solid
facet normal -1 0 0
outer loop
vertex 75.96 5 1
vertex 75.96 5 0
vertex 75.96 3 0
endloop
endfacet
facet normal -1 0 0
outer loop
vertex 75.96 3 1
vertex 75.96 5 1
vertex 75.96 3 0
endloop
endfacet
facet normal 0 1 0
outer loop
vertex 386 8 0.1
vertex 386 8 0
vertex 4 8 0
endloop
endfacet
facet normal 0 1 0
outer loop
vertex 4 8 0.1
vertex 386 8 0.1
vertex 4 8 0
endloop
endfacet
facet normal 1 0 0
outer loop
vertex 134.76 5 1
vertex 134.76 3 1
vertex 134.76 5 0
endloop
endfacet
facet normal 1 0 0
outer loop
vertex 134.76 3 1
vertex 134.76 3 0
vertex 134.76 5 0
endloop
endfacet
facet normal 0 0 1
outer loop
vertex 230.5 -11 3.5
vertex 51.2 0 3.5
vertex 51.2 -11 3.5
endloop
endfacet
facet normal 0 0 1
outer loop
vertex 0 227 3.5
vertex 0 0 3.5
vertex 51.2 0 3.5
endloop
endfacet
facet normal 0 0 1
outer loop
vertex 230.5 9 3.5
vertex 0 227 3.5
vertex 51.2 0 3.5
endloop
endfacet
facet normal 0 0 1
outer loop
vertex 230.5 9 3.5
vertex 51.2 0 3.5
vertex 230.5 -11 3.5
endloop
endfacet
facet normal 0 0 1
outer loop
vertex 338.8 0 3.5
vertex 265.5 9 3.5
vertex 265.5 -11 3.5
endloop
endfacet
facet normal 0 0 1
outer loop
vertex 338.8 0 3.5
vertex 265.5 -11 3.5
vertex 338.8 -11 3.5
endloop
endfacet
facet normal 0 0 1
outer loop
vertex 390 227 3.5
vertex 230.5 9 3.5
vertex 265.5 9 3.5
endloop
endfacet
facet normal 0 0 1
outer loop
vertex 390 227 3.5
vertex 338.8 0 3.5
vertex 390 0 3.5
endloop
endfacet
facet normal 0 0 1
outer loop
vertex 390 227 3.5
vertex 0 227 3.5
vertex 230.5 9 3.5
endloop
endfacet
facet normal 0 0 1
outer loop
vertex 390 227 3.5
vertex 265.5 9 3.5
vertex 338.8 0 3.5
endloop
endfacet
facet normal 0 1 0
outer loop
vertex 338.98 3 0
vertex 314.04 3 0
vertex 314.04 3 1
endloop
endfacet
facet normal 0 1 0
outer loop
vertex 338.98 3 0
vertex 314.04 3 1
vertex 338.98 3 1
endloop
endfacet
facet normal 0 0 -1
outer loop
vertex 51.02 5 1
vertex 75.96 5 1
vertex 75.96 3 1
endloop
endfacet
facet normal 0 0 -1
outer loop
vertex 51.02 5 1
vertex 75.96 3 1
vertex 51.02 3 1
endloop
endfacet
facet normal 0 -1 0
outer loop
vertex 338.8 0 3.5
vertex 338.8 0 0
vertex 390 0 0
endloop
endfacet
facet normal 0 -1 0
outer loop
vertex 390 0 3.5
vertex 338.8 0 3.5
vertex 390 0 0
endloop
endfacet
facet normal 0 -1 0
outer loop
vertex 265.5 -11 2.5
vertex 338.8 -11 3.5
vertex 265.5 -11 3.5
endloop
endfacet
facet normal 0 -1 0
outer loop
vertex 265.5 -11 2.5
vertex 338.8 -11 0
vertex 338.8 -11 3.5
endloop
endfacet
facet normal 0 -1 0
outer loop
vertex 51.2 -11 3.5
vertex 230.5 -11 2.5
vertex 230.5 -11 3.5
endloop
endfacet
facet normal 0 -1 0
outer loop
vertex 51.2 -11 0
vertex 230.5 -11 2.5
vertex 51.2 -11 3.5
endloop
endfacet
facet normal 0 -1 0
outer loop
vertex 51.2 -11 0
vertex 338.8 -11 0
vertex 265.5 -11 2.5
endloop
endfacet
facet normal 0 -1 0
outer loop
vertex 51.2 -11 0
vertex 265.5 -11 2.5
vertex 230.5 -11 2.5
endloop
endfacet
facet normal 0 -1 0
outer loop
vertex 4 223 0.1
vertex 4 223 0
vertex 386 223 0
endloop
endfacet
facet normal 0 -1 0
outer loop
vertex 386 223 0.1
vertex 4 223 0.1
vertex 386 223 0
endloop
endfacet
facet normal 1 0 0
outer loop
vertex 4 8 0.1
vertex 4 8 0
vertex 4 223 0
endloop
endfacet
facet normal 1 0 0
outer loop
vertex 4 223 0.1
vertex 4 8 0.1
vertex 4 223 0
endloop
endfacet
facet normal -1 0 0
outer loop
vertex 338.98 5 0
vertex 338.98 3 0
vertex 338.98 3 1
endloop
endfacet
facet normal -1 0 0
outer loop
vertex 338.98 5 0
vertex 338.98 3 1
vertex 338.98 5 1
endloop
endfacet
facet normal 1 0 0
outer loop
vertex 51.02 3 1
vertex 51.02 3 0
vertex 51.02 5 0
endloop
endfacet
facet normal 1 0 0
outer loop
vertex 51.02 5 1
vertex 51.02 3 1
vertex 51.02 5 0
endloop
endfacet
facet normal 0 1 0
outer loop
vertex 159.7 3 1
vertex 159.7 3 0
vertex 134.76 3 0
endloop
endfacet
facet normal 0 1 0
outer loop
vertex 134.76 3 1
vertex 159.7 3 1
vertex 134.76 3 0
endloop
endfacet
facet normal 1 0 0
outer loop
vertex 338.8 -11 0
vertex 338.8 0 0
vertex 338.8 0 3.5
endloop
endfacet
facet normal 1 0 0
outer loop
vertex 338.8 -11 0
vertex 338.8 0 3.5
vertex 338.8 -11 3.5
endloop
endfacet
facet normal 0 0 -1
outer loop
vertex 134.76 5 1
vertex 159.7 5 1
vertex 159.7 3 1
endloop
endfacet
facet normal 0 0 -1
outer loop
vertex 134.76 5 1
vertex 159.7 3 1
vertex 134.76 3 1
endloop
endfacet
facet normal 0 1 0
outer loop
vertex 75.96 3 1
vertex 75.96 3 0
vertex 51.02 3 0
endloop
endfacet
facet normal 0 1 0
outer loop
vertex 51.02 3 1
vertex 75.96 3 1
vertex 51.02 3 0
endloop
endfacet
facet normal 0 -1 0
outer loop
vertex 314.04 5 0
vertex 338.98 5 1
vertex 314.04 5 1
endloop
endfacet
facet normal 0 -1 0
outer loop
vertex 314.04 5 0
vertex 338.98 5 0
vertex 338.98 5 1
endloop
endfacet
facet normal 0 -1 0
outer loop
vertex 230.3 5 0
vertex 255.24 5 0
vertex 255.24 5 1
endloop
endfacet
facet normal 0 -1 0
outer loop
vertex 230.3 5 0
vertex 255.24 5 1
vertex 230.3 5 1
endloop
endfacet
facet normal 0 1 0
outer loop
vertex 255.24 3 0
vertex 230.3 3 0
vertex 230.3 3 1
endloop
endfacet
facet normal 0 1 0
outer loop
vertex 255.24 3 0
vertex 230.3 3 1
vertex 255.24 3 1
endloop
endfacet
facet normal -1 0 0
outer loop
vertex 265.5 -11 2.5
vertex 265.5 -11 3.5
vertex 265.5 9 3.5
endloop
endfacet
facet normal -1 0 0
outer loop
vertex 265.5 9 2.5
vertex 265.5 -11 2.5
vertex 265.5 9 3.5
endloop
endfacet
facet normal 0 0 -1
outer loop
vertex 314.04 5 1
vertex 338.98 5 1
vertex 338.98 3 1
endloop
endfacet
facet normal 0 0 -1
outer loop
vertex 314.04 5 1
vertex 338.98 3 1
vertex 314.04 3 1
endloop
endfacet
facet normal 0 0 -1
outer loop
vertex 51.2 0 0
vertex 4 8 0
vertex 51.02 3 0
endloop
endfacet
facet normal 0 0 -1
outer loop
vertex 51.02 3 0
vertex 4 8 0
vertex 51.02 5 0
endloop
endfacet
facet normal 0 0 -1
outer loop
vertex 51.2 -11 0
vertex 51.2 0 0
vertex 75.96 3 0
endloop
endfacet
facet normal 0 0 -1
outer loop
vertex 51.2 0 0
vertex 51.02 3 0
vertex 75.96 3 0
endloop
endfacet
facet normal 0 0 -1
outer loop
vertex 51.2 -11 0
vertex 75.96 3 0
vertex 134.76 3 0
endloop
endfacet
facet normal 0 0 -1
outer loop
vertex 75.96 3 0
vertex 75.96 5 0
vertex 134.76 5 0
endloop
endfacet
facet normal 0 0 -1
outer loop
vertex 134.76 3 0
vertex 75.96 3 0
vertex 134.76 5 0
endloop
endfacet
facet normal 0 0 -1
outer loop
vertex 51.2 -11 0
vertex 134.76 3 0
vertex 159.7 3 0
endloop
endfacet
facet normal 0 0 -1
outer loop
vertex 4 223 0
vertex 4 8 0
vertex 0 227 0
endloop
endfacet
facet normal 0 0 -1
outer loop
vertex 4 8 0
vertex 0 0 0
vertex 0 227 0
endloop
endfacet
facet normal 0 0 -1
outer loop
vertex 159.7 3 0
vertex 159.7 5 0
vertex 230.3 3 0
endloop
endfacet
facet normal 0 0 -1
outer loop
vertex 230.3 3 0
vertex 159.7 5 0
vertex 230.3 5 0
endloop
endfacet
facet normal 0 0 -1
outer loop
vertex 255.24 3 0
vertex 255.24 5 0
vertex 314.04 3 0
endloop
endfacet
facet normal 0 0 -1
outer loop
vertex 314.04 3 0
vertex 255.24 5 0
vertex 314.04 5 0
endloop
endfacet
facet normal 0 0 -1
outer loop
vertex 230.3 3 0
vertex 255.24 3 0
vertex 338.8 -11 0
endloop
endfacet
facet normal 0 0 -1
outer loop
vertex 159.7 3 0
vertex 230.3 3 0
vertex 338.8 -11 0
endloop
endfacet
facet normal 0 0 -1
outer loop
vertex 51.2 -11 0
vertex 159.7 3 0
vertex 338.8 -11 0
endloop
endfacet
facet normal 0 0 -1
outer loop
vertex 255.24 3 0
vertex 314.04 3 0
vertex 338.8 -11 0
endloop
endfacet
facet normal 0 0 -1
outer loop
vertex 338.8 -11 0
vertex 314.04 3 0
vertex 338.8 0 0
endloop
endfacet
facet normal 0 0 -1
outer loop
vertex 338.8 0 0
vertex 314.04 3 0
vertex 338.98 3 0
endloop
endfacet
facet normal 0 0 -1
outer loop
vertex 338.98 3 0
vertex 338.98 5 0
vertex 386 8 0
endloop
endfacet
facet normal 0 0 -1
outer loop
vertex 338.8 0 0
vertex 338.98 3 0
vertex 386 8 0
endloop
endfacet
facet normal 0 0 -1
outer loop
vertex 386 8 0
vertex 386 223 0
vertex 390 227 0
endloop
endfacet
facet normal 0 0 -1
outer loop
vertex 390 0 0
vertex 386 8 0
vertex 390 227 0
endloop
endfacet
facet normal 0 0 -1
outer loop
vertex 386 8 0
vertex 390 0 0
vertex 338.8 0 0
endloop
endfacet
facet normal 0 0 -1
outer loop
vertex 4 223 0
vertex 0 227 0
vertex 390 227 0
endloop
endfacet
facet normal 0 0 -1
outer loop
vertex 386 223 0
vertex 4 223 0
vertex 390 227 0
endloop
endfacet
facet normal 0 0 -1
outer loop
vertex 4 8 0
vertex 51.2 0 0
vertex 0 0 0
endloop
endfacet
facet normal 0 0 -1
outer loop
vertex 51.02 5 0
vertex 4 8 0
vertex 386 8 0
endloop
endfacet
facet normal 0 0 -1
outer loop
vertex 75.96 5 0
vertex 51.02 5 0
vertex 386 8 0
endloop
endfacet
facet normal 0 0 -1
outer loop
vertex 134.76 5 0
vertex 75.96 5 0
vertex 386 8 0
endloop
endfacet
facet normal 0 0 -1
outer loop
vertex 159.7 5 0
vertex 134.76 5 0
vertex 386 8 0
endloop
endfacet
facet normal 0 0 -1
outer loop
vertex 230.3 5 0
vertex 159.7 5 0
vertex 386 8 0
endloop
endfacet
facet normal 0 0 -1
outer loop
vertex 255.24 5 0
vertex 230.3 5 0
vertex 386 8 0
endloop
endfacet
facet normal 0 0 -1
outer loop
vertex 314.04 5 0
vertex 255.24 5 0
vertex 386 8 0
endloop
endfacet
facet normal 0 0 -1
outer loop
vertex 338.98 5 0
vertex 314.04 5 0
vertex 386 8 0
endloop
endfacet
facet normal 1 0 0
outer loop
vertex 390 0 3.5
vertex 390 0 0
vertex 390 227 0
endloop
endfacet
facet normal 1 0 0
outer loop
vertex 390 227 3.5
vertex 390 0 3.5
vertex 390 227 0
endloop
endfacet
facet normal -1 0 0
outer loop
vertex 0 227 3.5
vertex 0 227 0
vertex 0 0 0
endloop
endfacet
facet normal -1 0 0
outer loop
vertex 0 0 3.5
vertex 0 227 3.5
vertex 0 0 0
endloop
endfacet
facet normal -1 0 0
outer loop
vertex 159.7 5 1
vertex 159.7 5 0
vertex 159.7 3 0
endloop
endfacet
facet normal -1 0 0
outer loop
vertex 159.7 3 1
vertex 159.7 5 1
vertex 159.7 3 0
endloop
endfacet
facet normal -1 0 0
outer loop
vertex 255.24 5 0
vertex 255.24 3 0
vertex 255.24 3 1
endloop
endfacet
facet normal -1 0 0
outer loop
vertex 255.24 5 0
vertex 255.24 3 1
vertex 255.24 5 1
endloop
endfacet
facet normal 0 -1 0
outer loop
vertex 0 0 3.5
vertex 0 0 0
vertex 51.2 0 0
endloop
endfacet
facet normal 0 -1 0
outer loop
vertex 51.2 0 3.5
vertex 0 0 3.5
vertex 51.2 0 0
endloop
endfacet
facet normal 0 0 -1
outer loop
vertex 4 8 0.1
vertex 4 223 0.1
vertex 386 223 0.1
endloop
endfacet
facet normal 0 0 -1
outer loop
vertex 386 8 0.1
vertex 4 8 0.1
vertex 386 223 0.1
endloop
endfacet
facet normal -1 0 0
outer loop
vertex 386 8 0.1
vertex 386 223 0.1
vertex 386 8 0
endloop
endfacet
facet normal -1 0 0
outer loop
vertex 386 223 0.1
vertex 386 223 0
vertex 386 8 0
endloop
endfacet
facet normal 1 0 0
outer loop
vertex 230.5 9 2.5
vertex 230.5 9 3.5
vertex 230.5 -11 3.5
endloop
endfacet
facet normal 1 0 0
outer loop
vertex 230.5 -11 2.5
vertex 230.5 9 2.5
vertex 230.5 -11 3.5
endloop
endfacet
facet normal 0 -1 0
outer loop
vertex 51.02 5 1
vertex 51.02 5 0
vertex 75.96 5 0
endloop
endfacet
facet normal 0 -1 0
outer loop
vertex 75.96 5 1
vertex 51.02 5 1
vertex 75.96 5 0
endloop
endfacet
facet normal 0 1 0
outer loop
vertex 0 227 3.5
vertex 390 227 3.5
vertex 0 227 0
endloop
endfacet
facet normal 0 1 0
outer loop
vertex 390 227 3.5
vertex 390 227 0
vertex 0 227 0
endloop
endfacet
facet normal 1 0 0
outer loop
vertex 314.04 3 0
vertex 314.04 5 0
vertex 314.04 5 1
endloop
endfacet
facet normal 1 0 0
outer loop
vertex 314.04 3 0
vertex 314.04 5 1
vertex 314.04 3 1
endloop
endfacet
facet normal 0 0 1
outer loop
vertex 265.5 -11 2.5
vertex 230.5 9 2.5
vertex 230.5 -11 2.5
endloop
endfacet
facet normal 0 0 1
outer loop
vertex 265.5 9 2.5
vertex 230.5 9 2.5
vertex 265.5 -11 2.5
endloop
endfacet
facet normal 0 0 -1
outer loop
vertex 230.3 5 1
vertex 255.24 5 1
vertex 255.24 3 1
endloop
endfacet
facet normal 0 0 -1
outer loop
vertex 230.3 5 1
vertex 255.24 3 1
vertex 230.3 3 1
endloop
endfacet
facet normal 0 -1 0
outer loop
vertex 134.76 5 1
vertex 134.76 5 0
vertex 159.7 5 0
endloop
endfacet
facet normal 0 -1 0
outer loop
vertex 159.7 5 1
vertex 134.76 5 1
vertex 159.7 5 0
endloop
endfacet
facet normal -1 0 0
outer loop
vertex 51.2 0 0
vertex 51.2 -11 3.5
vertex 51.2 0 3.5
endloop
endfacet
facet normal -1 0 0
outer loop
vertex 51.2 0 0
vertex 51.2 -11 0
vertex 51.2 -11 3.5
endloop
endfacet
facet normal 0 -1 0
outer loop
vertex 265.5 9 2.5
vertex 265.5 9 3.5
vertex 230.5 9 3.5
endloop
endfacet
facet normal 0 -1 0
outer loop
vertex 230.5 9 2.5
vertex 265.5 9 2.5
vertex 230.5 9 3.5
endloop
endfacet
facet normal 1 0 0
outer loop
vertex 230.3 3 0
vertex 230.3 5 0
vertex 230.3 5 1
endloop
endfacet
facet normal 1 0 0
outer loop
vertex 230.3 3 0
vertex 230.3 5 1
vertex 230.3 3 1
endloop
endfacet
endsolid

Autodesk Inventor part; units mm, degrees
ref_plane "YZ Plane" through (0, 0, 0) normal (1, 0, 0) x (0, 1, 0)
ref_plane "XZ Plane" through (0, 0, 0) normal (0, 1, 0) x (-1, 0, 0)
ref_plane "XY Plane" through (0, 0, 0) normal (0, 0, 1) x (1, 0, 0)
sketch "Эскиз1" plane through (0, 0, 0) normal (0, 0, 1) x (1, 0, 0)
  line L0 (0, 0) -> (390, 0)
  line L1 (390, 0) -> (390, 227)
  line L2 (390, 227) -> (0, 227)
  line L3 (0, 227) -> (0, 0)
  line L4 (4, 223) -> (386, 223)
  line L5 (386, 223) -> (386, 8)
  line L6 (386, 8) -> (4, 8)
  line L7 (4, 8) -> (4, 223)
  line L8 (51.2, 0) -> (338.8, 0)
  line L9 (338.8, 0) -> (338.8, -11)
  line L10 (338.8, -11) -> (51.2, -11)
  line L11 (51.2, -11) -> (51.2, 0)
  line L12 (195, 8) -> (195, 37.2602)
  point P0 (195, 223)
  point P1 (195, 227)
  point P2 (195, -11)
  dimension "d0" = 390
  dimension "d1" = 227
  dimension "d2" = 382
  dimension "d3" = 215
  dimension "d4" = 4
  dimension "d5" = 8
  dimension "d6" = 4
  dimension "d7" = 238
  dimension "d9" = 287.6
extrude "Выдавливание1" add sketch "Эскиз1" along normal blind 3.5
sketch "Эскиз2" plane through (0, 0, 3.5) normal (0, 0, 1) x (1, 0, 0)
  line L0 (0, 0) -> (51.2, 0) projected
  line L1 (51.2, 0) -> (51.2, -11) projected
  line L2 (51.2, -11) -> (338.8, -11) projected
  line L3 (338.8, -11) -> (338.8, 0) projected
  line L4 (338.8, 0) -> (390, 0) projected
  line L5 (390, 0) -> (390, 227) projected
  line L6 (390, 227) -> (0, 227) projected
  line L7 (0, 227) -> (0, 0) projected
  line L8 (386, 223) -> (386, 8) projected
  line L9 (386, 8) -> (4, 8) projected
  line L10 (4, 8) -> (4, 223) projected
  line L11 (4, 223) -> (386, 223) projected
extrude "Выдавливание2" add sketch "Эскиз2" against normal blind 3.4 contours L8 L9 L10 L11
sketch "Эскиз3" plane through (0, 0, 0) normal (0, 0, -1) x (-1, 0, 0)
  line L0 (0, 0) -> (-51.2, 0) projected
  line L1 (0, 227) -> (0, 0) projected
  line L2 (-390, 227) -> (0, 227) projected
  line L3 (-390, 0) -> (-390, 227) projected
  line L4 (-338.8, 0) -> (-390, 0) projected
  line L5 (-338.8, -11) -> (-338.8, 0) projected
  line L6 (-51.2, -11) -> (-338.8, -11) projected
  line L7 (-51.2, 0) -> (-51.2, -11) projected
  line L8 (-386, 223) -> (-386, 8) projected
  line L9 (-4, 223) -> (-386, 223) projected
  line L10 (-4, 8) -> (-4, 223) projected
  line L11 (-386, 8) -> (-4, 8) projected
  line L12 (-195, -11) -> (-195, 1.1845)
  line L13 (-255.24, 5) -> (-230.3, 5)
  line L14 (-230.3, 5) -> (-230.3, 3)
  line L15 (-230.3, 3) -> (-255.24, 3)
  line L16 (-255.24, 3) -> (-255.24, 5)
  line L17 (-338.98, 5) -> (-314.04, 5)
  line L18 (-314.04, 5) -> (-314.04, 3)
  line L19 (-314.04, 3) -> (-338.98, 3)
  line L20 (-338.98, 3) -> (-338.98, 5)
  line L21 (-134.76, 5) -> (-159.7, 5)
  line L22 (-159.7, 5) -> (-159.7, 3)
  line L23 (-159.7, 3) -> (-134.76, 3)
  line L24 (-134.76, 3) -> (-134.76, 5)
  line L25 (-51.02, 5) -> (-75.96, 5)
  line L26 (-75.96, 5) -> (-75.96, 3)
  line L27 (-75.96, 3) -> (-51.02, 3)
  line L28 (-51.02, 3) -> (-51.02, 5)
  point P0 (-314.04, 4)
  point P1 (-255.24, 4)
  point P2 (-75.96, 4)
  point P3 (-134.76, 4)
  dimension "d14" = 24.94
  dimension "d15" = 35.3
  dimension "d16" = 3
  dimension "d17" = 2
  dimension "d18" = 2
  dimension "d19" = 24.94
  dimension "d20" = 58.8
extrude "Выдавливание3" cut sketch "Эскиз3" against normal blind 1 contours L13 L14 L15 L16 | L17 L18 L19 L20 | L24 L23 L22 L21 | L28 L27 L26 L25
sketch "Эскиз5" plane through (0, 0, 3.5) normal (0, 0, 1) x (1, 0, 0)
  line L0 (0, 0) -> (51.2, 0) projected
  line L1 (51.2, 0) -> (51.2, -11) projected
  line L2 (51.2, -11) -> (338.8, -11) projected
  line L3 (338.8, -11) -> (338.8, 0) projected
  line L4 (338.8, 0) -> (390, 0) projected
  line L5 (390, 0) -> (390, 227) projected
  line L6 (390, 227) -> (0, 227) projected
  line L7 (0, 227) -> (0, 0) projected
  line L8 (230.5, -11) -> (265.5, -11)
  line L9 (265.5, -11) -> (265.5, 9)
  line L10 (265.5, 9) -> (230.5, 9)
  line L11 (230.5, 9) -> (230.5, -11)
  dimension "d23" = 124.5
  dimension "d24" = 20
  dimension "d25" = 35
extrude "Выдавливание4" cut sketch "Эскиз5" against normal blind 1 contours L11 L10 L9 L2
equation "\"d19\" = d14"
properties part number "NV173FHM-N4G V8.0"
